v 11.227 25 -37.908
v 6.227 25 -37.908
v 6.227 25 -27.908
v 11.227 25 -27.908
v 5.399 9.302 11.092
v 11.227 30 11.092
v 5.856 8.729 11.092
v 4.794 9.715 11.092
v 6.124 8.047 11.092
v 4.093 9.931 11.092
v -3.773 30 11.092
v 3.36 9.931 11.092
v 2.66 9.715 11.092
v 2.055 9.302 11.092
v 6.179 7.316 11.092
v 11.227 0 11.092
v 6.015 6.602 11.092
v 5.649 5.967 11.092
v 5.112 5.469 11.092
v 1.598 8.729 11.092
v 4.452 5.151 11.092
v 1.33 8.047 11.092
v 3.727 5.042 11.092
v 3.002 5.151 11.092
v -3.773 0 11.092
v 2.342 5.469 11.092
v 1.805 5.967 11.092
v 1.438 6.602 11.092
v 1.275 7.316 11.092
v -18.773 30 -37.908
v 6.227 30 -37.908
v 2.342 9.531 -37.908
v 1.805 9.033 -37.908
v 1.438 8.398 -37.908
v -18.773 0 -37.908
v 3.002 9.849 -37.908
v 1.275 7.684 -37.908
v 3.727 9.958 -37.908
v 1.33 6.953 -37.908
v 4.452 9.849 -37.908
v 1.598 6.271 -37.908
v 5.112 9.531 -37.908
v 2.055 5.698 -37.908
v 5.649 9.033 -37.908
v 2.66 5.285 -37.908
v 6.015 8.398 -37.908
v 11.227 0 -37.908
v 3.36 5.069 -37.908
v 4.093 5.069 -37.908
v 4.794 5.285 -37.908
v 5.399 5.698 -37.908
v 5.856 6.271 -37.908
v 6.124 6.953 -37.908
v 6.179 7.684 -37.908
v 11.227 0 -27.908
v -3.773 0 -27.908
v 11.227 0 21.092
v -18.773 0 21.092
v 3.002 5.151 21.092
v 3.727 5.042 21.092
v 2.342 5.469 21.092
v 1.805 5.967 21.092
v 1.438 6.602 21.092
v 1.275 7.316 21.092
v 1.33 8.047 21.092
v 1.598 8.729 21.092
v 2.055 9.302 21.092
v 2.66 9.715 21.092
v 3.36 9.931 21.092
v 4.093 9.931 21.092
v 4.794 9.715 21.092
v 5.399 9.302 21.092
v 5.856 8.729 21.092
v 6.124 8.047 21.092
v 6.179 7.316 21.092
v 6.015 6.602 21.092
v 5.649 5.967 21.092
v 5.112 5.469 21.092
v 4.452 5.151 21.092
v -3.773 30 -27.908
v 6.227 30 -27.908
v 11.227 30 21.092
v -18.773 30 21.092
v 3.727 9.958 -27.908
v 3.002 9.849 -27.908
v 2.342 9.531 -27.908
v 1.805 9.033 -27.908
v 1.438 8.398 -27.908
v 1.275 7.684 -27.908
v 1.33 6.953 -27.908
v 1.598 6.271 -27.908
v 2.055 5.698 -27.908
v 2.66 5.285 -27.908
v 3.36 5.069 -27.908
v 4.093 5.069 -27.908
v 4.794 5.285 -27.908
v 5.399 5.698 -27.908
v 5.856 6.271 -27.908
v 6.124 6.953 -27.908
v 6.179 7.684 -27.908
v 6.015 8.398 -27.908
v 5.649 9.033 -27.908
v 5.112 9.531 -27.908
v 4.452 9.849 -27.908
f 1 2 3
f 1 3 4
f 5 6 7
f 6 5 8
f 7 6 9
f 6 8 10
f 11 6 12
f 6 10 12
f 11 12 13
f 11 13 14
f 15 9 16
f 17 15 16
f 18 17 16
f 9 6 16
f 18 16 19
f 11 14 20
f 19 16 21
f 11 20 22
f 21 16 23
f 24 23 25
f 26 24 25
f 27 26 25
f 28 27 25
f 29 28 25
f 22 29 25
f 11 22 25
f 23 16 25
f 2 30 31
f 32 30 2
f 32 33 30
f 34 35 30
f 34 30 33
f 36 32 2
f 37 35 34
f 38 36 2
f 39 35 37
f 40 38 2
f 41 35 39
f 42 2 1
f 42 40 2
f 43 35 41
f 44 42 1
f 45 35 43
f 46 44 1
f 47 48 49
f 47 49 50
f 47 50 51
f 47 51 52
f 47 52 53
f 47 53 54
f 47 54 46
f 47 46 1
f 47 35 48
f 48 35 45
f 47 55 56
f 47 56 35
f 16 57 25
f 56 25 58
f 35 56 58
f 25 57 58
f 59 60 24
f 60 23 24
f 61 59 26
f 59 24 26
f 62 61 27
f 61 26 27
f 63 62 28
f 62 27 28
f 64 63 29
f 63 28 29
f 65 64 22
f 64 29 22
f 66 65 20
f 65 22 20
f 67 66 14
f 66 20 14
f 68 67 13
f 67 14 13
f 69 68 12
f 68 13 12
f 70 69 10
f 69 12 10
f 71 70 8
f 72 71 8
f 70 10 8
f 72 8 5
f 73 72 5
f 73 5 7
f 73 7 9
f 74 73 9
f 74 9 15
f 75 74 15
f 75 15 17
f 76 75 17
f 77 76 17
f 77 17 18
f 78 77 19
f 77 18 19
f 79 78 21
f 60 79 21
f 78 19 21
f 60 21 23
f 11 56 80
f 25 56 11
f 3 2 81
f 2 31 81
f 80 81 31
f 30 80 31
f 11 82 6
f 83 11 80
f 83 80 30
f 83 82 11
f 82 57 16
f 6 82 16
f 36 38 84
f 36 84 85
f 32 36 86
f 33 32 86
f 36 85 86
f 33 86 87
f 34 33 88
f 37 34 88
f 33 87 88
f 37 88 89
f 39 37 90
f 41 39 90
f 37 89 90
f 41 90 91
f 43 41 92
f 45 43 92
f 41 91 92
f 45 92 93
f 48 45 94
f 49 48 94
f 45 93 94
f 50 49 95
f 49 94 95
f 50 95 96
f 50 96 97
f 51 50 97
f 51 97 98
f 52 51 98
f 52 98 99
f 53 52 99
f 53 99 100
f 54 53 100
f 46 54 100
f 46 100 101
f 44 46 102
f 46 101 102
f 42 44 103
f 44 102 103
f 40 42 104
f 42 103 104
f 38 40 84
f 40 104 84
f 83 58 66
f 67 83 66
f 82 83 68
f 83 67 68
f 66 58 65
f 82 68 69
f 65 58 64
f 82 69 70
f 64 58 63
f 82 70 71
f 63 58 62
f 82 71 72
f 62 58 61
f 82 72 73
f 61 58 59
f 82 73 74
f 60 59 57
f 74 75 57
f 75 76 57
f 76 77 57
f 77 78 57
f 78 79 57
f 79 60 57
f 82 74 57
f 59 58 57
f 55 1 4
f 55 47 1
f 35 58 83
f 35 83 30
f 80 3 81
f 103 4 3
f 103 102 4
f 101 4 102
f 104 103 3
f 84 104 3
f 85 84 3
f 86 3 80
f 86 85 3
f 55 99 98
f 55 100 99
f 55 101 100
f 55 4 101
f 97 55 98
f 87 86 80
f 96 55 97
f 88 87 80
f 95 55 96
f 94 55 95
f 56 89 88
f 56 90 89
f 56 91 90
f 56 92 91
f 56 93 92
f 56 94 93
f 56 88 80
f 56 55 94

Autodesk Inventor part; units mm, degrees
ref_plane "YZ Plane" through (0, 0, 0) normal (1, 0, 0) x (0, 1, 0)
ref_plane "XZ Plane" through (0, 0, 0) normal (0, 1, 0) x (-1, 0, 0)
ref_plane "XY Plane" through (0, 0, 0) normal (0, 0, 1) x (1, 0, 0)
sketch "Skizze1" plane through (0, 0, 0) normal (0, 1, 0) x (-1, 0, 0)
  line L0 (3.7731, -4.4076) -> (3.7731, -12.4076)
  line L1 (10.7449, 21.0924) -> (18.7731, 21.0924)
  line L2 (18.7731, 21.0924) -> (18.7731, -37.9076)
  line L3 (18.7731, -37.9076) -> (10.7449, -37.9076)
  line L4 (10.7449, 21.0924) -> (-11.2269, 21.0924)
  line L5 (-11.2269, 21.0924) -> (-11.2269, 11.0924)
  line L6 (-11.2269, 11.0924) -> (3.7731, 11.0924)
  line L7 (10.7449, -37.9076) -> (-11.2269, -37.9076)
  line L8 (-11.2269, -37.9076) -> (-11.2269, -27.9076)
  line L9 (-11.2269, -27.9076) -> (3.7731, -27.9076)
  line L10 (3.7731, -12.4076) -> (3.7731, -12.4076)
  line L11 (3.7731, -4.4076) -> (3.7731, -4.4076)
  line L12 (3.7731, -27.9076) -> (3.7731, -12.4076)
  line L13 (3.7731, -4.4076) -> (3.7731, 11.0924)
  point P0 (0, 0)
  dimension "d1" = 15
  dimension "d2" = 15.5
  dimension "d3" = 15.5
  dimension "d5" = 10
  dimension "d6" = 59
  dimension "d7" = 0
  dimension "d8" = 15
  dimension "d64" = 8
  dimension "d65" = 10
extrude "Extrusion1" add sketch "Skizze1" along normal blind 30
sketch "Skizze2" plane through (0, 30, 0) normal (0, 1, 0) x (1, 0, 0)
  line L0 (11.2269, 27.9076) -> (11.2269, 37.9076) projected
  line L1 (11.2269, 37.9076) -> (6.2269, 37.9076)
  line L2 (6.2269, 37.9076) -> (6.2269, 27.9076)
  line L3 (6.2269, 27.9076) -> (11.2269, 27.9076)
  line L4 (11.2269, 27.9076) -> (11.2269, 37.9076)
  line L5 (-3.7731, 27.9076) -> (11.2269, 27.9076) projected
  point P0 (0, 0)
  dimension "d11" = 0
  dimension "d12" = 5
extrude "Extrusion2" cut sketch "Skizze2" against normal blind 5
sketch "Skizze6" plane through (-18.7731, 0, 21.0924) normal (0, 0, 1) x (1, 0, 0)
  circle A0 centre (22.5, 7.5) radius 4.6596
  line L0 (30, 0) -> (0, 0) projected
  line L1 (30, 0) -> (30, 30) projected
  point P0 (18.7731, 0)
  dimension "d27" = 7.5
  dimension "d28" = 7.5
hole "Bohrung1" at (3.7269, 7.5, 21.0924) direction (0, 0, -1) diameter 4.917 depth 17 tip angle 118 thread size "M6x1" class "6H" standard "ANSI Metric M Profile"
sketch "Skizze8" plane through (11.2269, 0, -37.9076) normal (0, 0, -1) x (-1, 0, 0)
  circle A0 centre (7.5, 7.5) radius 1.9257
  line L0 (30, 0) -> (0, 0) projected
  line L1 (0, 0) -> (0, 25) projected
  point P0 (11.2269, 0)
  dimension "d45" = 7.5
  dimension "d46" = 7.5
hole "Bohrung3" at (3.7269, 7.5, -37.9076) direction (0, 0, 1) diameter 4.917 depth 17 tip angle 118 thread size "M6x1" class "6H" standard "ANSI Metric M Profile"
properties material "Nylon 6"
